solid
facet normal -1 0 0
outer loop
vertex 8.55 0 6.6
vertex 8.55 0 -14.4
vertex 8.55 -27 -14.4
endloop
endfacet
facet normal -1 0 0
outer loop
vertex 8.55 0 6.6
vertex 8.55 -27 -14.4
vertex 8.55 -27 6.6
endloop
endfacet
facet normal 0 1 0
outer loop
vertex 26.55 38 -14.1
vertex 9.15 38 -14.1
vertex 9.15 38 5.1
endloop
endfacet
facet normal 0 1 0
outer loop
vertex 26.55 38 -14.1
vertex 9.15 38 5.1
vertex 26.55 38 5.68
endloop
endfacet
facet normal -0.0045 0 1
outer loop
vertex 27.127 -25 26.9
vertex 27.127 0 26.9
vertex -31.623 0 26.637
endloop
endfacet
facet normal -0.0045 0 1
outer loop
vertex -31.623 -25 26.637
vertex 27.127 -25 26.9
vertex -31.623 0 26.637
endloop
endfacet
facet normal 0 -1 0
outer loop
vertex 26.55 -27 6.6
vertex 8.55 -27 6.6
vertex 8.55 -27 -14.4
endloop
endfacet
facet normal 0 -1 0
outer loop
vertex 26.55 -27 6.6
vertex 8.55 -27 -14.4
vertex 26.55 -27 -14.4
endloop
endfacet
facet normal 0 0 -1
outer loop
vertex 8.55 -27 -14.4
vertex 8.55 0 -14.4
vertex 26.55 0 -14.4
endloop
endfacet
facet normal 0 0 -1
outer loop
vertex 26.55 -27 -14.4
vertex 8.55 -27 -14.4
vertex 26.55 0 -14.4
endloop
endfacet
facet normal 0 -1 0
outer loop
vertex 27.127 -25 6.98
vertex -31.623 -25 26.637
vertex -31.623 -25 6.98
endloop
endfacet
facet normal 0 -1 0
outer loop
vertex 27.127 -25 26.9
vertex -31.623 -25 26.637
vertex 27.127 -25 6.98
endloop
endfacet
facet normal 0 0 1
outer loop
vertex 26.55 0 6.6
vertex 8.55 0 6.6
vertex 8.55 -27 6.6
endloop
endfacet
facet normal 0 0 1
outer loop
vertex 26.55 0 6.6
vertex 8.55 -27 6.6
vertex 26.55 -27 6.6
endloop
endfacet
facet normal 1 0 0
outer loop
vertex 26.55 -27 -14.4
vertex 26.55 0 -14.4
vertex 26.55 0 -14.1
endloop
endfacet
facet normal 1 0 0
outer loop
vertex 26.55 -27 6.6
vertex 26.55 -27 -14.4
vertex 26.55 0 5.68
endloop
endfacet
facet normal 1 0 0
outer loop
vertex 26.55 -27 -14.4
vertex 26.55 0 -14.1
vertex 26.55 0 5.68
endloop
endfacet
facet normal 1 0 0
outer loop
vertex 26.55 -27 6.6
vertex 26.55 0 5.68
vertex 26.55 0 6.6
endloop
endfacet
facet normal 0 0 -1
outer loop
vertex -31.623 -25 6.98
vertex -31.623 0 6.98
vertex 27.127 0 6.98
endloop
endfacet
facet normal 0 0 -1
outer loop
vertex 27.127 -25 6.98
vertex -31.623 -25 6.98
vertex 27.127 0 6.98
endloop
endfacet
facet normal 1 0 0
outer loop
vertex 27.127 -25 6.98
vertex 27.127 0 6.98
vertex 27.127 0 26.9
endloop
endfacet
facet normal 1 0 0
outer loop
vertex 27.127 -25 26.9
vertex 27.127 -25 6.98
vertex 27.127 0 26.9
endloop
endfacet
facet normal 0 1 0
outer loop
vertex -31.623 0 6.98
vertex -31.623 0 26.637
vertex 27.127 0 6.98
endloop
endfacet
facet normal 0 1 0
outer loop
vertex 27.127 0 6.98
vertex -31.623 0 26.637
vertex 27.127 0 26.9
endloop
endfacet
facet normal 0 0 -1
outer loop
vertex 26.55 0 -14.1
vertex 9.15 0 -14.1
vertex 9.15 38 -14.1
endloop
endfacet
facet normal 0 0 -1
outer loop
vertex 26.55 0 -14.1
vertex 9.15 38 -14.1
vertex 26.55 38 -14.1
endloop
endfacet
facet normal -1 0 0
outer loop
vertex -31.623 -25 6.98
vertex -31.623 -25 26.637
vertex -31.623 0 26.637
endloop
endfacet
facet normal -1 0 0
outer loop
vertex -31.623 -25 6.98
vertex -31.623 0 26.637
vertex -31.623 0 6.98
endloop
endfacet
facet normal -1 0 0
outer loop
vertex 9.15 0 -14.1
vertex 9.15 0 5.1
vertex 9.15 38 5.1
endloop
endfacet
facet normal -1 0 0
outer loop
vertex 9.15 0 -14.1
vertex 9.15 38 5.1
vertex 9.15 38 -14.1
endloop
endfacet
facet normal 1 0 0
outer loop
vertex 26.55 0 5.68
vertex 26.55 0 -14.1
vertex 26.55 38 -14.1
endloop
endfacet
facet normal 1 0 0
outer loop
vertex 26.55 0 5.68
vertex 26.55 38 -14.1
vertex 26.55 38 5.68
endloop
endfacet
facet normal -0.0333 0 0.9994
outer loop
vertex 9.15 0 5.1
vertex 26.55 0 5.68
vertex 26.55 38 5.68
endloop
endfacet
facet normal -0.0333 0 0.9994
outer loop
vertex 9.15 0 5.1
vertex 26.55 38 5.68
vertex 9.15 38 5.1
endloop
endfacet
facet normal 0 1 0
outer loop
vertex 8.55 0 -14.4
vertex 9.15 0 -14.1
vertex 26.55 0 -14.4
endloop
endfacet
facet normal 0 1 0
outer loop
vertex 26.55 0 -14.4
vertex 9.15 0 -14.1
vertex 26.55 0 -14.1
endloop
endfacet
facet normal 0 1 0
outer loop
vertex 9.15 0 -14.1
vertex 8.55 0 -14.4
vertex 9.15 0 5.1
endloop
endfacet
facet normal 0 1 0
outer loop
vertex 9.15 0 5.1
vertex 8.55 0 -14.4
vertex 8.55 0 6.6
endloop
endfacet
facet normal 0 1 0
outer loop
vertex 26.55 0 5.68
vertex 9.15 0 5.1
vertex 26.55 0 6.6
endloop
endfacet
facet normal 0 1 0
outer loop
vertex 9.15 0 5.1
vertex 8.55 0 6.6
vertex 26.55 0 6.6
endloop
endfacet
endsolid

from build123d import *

# Parameters (mm, degrees)
F1_DEPTH = 25
F2_W     = 18.000001
F2_H     = 21.000001
F3_DEPTH = 27
F5_DEPTH = 38


with BuildPart() as f1:
    # F0 (on Front) → F1 (new body)
    with BuildSketch(Plane.XZ):
        Polygon((27.126904, 26.899949), (-31.622506, 26.636774), (-31.622506, 6.979949), (27.126904, 6.979949), align=None)
    extrude(amount=F1_DEPTH)


with BuildPart() as f3:
    # F2 (on Front) → F3 (new body)
    with BuildSketch(Plane.XZ):
        with Locations((17.55, -3.9)):
            Rectangle(F2_W, F2_H)
    extrude(amount=F3_DEPTH)

    # F4 (on Front) → F5 (join)
    with BuildSketch(Plane.XZ):
        Polygon((26.550001, 5.68), (9.15, 5.1), (9.15, -14.1), (26.550001, -14.1), align=None)
    extrude(amount=-F5_DEPTH)


solid = Compound([f1.part, f3.part])
